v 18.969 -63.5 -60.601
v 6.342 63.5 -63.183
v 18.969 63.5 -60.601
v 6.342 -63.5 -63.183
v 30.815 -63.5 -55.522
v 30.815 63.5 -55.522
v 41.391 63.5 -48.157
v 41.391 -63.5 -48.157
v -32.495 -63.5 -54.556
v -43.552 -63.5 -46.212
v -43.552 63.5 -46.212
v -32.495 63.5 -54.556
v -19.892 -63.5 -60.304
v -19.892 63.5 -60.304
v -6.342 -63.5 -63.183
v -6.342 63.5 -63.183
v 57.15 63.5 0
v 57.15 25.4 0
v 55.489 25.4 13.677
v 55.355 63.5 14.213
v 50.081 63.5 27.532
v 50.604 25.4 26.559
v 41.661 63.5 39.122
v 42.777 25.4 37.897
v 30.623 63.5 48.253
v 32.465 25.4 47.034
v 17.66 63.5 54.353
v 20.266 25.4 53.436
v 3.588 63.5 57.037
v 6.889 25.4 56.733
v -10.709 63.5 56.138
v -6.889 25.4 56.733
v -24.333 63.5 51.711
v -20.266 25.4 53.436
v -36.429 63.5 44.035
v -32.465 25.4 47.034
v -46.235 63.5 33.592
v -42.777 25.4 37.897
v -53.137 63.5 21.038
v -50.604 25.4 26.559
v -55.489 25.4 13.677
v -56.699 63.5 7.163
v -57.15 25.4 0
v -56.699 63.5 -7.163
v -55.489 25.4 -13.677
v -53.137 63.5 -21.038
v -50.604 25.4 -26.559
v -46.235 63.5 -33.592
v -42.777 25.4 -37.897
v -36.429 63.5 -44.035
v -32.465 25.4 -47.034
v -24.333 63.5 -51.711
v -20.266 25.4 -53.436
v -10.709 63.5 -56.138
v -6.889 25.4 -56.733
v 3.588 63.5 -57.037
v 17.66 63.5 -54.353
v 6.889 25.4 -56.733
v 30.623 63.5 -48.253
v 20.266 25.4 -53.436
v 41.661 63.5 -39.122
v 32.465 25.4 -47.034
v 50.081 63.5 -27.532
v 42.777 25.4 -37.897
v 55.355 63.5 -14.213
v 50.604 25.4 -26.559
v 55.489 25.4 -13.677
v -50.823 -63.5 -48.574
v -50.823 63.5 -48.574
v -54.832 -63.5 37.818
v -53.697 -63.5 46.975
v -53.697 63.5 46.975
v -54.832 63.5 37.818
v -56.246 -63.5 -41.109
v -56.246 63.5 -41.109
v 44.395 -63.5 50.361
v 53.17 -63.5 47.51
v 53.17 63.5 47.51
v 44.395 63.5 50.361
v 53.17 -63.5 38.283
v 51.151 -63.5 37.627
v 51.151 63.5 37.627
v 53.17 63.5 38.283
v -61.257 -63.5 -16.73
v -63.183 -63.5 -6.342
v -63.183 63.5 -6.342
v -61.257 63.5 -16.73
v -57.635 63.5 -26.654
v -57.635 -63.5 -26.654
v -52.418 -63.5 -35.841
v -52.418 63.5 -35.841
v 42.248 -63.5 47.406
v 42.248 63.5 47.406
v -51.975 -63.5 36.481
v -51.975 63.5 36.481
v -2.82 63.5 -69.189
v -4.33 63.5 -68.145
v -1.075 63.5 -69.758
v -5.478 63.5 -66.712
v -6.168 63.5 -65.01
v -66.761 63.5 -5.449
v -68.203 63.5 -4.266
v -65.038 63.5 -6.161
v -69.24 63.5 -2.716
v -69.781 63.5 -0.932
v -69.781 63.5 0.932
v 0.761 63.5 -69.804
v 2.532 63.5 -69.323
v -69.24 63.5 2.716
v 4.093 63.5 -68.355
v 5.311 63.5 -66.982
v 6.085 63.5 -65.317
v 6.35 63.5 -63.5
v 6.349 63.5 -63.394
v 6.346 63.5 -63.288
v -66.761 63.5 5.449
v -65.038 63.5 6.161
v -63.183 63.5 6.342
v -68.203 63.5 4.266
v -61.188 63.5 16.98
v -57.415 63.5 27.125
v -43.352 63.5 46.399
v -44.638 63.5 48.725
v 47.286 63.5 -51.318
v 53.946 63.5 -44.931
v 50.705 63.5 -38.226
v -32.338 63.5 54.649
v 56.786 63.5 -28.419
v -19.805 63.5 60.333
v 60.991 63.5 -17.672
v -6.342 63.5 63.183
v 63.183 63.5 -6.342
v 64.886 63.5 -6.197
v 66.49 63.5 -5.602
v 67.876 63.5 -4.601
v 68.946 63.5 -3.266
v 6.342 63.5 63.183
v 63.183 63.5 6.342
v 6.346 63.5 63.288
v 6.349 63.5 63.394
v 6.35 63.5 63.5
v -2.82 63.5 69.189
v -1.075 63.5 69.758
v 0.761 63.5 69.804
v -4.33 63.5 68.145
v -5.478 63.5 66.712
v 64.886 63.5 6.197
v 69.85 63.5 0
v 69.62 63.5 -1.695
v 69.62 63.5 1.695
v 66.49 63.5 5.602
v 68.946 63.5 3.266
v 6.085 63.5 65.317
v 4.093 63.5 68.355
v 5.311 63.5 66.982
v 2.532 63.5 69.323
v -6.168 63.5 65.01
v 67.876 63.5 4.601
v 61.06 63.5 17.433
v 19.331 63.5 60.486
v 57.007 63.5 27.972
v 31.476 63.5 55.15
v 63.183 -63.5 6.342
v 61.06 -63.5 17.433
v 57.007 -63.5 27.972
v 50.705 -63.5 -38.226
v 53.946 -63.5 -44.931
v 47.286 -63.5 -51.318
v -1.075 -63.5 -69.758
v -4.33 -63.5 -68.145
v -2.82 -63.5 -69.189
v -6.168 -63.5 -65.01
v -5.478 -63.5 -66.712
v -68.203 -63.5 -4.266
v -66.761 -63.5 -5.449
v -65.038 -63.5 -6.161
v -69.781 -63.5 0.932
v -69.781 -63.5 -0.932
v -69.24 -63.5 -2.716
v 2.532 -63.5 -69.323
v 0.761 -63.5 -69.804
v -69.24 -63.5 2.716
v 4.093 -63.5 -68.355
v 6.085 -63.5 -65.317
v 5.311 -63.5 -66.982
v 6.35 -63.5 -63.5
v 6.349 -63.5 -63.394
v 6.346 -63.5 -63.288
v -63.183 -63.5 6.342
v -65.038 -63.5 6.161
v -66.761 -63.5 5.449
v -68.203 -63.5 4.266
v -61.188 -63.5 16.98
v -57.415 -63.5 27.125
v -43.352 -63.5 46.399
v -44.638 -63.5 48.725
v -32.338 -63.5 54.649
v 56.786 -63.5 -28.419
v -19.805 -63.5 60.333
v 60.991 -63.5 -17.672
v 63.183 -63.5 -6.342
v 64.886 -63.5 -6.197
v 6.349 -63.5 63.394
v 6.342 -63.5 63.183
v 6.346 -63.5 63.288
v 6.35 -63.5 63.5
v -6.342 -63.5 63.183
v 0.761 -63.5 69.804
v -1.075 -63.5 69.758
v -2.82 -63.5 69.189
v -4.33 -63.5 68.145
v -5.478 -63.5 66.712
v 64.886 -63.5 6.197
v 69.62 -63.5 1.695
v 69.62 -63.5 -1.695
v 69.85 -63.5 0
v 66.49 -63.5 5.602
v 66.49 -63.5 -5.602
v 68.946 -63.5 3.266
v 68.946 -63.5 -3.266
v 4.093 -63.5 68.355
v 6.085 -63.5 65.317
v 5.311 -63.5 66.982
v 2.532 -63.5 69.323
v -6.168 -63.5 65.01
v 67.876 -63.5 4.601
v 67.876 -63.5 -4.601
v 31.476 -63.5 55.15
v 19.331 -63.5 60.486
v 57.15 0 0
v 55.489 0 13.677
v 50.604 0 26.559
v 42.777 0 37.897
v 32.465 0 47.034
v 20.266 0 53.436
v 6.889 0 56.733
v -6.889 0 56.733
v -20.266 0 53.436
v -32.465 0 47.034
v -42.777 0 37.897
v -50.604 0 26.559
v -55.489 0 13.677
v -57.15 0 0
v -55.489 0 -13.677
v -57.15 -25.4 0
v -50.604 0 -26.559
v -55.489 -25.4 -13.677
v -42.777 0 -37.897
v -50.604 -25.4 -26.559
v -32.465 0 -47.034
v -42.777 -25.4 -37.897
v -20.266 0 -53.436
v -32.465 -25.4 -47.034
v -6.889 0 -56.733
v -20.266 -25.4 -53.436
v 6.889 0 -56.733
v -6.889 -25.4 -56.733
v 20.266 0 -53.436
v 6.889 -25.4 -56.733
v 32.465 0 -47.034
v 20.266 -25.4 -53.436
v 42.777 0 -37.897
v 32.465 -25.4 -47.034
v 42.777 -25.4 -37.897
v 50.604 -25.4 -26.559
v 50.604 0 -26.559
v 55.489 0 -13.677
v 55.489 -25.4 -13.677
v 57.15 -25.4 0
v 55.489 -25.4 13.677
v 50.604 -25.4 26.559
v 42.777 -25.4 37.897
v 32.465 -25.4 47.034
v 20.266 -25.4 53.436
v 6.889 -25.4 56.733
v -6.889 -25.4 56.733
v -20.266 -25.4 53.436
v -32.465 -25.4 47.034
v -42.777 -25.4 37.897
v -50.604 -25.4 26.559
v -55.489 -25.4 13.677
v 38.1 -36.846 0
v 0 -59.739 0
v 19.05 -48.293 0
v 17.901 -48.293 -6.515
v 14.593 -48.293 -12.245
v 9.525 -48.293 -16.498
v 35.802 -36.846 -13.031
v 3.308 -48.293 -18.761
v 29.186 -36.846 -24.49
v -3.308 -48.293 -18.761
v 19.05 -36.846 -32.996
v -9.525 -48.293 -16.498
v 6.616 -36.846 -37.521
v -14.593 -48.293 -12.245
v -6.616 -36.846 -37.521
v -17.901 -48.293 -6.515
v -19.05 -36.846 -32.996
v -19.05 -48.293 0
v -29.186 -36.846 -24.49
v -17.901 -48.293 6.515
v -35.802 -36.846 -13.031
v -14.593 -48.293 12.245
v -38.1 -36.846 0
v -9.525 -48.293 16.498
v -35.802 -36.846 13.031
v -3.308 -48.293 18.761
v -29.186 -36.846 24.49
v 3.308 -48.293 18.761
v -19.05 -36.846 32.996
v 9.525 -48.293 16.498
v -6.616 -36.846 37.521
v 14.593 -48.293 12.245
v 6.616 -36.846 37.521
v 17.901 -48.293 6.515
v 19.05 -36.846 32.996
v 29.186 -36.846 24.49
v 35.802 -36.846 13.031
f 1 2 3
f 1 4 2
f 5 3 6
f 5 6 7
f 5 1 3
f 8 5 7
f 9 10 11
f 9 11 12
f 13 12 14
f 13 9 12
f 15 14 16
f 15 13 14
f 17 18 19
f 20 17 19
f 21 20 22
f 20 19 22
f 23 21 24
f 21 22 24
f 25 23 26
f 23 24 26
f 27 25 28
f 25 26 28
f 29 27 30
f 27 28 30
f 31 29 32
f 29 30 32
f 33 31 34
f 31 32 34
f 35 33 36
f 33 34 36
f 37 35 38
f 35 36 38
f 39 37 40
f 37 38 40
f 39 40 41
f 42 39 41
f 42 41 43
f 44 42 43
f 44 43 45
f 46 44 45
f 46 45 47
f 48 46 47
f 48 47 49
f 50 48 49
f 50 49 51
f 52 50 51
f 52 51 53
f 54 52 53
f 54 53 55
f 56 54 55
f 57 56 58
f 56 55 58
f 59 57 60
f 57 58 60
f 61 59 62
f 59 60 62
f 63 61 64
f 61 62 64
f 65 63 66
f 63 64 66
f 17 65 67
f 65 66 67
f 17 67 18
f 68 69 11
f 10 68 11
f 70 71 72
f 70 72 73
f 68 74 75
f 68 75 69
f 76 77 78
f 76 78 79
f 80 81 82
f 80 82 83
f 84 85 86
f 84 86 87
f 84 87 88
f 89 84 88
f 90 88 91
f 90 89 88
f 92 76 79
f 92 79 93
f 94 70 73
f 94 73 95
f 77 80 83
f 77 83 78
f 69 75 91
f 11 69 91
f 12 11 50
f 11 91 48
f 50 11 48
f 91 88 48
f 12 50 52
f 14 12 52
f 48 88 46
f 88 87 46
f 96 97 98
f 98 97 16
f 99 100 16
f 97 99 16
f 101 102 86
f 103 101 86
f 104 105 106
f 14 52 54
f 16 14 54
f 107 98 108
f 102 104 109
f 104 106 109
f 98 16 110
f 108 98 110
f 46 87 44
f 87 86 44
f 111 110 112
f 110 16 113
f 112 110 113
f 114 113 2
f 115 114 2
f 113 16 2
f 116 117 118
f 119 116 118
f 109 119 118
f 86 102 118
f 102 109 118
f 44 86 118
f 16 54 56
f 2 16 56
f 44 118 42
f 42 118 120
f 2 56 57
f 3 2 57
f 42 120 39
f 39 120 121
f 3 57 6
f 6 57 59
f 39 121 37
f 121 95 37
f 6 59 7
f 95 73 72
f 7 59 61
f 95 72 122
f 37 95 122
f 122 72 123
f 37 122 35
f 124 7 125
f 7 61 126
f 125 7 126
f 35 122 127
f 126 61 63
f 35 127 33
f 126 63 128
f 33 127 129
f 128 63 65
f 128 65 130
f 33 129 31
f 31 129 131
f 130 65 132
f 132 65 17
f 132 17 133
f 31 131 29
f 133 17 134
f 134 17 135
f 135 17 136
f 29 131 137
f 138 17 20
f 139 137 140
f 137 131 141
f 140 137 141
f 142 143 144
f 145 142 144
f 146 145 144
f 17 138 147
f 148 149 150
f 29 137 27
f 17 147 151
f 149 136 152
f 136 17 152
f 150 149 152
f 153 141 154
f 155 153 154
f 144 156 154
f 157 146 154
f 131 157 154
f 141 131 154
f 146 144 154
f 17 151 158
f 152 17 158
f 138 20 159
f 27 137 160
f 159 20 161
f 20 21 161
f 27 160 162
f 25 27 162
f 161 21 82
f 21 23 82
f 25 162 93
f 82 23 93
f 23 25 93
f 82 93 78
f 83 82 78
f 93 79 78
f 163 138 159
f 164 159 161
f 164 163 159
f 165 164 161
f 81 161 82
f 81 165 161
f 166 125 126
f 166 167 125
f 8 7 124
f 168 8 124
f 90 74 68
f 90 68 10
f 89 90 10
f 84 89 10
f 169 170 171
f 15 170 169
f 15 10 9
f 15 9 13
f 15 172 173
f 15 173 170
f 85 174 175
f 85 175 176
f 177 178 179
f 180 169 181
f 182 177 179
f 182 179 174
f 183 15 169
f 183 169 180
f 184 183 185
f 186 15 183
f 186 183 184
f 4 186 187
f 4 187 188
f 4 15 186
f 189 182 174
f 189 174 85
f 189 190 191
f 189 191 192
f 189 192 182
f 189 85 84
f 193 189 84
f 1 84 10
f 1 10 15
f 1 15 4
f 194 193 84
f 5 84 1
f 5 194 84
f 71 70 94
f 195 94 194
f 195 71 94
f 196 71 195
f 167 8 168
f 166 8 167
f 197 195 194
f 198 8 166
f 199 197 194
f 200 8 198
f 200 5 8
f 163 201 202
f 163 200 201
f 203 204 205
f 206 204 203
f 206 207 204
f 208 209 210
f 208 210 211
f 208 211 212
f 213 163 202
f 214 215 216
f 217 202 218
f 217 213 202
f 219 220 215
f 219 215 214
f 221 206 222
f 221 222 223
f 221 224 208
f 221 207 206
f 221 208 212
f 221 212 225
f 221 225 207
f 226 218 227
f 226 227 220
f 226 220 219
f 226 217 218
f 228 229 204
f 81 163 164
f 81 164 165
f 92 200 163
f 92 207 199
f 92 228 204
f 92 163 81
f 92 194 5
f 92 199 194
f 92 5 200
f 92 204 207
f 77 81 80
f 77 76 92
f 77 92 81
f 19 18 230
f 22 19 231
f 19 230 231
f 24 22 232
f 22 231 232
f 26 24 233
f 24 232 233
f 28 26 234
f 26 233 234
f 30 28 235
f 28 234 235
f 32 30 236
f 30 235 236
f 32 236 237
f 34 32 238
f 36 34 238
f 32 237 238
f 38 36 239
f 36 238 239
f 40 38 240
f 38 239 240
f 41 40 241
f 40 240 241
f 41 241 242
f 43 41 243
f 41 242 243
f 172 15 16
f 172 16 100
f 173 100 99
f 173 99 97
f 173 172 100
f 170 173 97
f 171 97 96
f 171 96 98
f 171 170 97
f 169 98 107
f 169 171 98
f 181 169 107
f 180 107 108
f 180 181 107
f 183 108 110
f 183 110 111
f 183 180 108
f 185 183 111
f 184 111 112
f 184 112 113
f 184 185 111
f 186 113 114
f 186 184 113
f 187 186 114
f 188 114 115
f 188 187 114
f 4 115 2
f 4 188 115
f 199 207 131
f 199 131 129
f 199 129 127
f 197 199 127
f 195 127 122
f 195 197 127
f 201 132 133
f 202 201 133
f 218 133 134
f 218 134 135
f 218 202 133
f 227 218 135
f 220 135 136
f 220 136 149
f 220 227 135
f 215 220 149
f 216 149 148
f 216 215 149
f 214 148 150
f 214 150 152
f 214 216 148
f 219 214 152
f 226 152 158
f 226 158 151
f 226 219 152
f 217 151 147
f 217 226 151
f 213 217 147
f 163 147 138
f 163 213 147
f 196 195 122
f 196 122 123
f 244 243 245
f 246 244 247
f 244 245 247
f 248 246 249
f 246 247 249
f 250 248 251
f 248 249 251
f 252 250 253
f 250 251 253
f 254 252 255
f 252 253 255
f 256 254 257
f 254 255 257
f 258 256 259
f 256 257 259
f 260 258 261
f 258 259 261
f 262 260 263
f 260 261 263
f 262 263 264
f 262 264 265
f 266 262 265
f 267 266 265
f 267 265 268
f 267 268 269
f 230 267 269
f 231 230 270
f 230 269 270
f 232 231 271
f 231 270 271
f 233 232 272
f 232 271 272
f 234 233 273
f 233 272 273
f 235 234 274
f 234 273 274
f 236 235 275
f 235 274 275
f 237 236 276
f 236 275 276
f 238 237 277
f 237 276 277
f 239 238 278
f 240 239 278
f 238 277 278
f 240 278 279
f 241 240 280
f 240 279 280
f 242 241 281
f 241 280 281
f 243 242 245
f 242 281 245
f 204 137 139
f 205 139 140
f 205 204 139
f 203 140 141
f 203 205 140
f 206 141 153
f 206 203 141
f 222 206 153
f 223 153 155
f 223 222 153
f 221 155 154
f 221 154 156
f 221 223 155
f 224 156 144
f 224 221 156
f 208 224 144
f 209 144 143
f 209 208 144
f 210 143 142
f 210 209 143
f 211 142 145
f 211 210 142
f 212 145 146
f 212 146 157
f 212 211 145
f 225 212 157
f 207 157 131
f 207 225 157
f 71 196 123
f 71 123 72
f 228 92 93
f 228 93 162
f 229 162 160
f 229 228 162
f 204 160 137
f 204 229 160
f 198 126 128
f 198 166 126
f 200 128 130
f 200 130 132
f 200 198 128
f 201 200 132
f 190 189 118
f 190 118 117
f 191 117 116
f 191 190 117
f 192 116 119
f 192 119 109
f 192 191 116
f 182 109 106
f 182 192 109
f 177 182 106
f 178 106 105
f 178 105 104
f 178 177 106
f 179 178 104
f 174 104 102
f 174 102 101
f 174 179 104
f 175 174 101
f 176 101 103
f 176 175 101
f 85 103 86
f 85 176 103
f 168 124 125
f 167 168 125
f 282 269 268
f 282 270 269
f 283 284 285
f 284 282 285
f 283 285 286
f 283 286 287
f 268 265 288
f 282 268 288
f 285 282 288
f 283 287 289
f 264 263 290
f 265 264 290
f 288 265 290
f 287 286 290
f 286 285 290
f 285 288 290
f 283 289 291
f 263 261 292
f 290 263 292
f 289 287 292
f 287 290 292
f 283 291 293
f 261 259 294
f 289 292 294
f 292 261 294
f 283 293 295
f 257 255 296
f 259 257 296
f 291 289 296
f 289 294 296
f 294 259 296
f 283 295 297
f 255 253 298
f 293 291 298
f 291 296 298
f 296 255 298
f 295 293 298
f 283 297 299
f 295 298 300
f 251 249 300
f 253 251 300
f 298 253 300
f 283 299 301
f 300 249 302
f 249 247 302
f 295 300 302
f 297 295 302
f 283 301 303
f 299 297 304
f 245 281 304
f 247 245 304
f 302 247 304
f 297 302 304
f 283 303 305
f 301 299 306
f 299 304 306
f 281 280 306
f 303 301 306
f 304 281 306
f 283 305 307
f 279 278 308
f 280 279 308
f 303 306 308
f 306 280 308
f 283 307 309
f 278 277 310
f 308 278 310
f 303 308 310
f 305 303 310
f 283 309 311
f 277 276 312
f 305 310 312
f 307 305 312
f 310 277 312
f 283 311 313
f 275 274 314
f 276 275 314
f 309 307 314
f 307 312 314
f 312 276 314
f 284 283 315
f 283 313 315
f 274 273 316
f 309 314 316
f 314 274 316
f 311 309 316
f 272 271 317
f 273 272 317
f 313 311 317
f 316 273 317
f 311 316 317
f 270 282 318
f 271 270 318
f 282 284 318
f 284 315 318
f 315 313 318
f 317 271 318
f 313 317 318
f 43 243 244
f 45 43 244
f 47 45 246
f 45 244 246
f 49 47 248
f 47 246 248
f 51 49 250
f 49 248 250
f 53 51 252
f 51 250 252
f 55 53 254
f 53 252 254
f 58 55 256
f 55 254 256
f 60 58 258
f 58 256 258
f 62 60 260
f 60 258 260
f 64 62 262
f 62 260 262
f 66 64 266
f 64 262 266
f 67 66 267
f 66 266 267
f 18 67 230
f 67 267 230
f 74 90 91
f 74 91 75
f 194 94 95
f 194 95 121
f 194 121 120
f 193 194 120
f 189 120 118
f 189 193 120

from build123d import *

# Parameters (mm, degrees)
F1_DEPTH = 63.5
F2_D     = 114.3
F2_DEPTH = 63.501
F3_D     = 114.3
F3_DEPTH = 25.4
F3_TIP   = 34.3391843774


with BuildPart() as f1:
    # F0 (on Front) → F1 (new body, symmetric)
    with BuildSketch(Plane.XZ):
        with BuildLine():
            ThreePointArc((63.1825, -6.3420575329), (63.4205753285, -3.175), (63.5, 0))
            ThreePointArc((63.5, 0), (63.4205753285, 3.175), (63.1825, 6.3420575329))
            ThreePointArc((63.1825, 6.3420575329), (57.15, 0), (63.1825, -6.3420575329))
        make_face()
        with BuildLine():
            ThreePointArc((63.1825, 6.3420575329), (63.4205753285, 3.175), (63.5, 0))
            ThreePointArc((63.5, 0), (63.4205753285, -3.175), (63.1825, -6.3420575329))
            ThreePointArc((63.1825, -6.3420575329), (67.8764354788, -4.6010121169), (69.85, 0))
            ThreePointArc((69.85, 0), (67.8764354788, 4.6010121169), (63.1825, 6.3420575329))
        make_face()
        with BuildLine():
            ThreePointArc((63.1825, -6.3420575329), (57.15, 0), (63.1825, 6.3420575329))
            ThreePointArc((63.1825, 6.3420575329), (59.2684226035, 22.7926321889), (51.1514073356, 37.6268989898))
            Line((51.1514073356, 37.6268989898), (44.3948691925, 35.4315666688))
            Line((44.3948691925, 35.4315666688), (38.9713217069, 42.8964393729))
            Line((38.9713217069, 42.8964393729), (42.2479521953, 47.4063343373))
            ThreePointArc((42.2479521953, 47.4063343373), (25.5434749418, 58.1358829631), (6.3420575329, 63.1825))
            ThreePointArc((6.3420575329, 63.1825), (0, 57.15), (-6.3420575329, 63.1825))
            ThreePointArc((-6.3420575329, 63.1825), (-26.2258003585, 57.831283883), (-43.351850487, 46.3989984736))
            Line((-43.351850487, 46.3989984736), (-40.1734631197, 40.6496002242))
            Line((-40.1734631197, 40.6496002242), (-46.4740063985, 33.9085063805))
            Line((-46.4740063985, 33.9085063805), (-51.9747429826, 36.4811744862))
            ThreePointArc((-51.9747429826, 36.4811744862), (-59.5179741382, 22.132798162), (-63.1825, 6.3420575329))
            ThreePointArc((-63.1825, 6.3420575329), (-58.8989878831, 4.3764354788), (-57.15, 0))
            ThreePointArc((-57.15, 0), (-58.8989878831, -4.3764354788), (-63.1825, -6.3420575329))
            ThreePointArc((-63.1825, -6.3420575329), (-59.6526265915, -21.7672722391), (-52.4184059941, -35.8407688679))
            Line((-52.4184059941, -35.8407688679), (-50.8226124015, -33.6443474184))
            Line((-50.8226124015, -33.6443474184), (-42.0471282301, -36.4956750697))
            Line((-42.0471282301, -36.4956750697), (-42.0471282301, -45.7227651753))
            Line((-42.0471282301, -45.7227651753), (-43.5515690674, -46.2115876352))
            ThreePointArc((-43.5515690674, -46.2115876352), (-26.3504546537, -57.7745925087), (-6.3420575329, -63.1825))
            ThreePointArc((-6.3420575329, -63.1825), (0, -57.15), (6.3420575329, -63.1825))
            ThreePointArc((6.3420575329, -63.1825), (25.0210307502, -58.3626423339), (41.3908210079, -48.1565149932))
            Line((41.3908210079, -48.1565149932), (39.1545134974, -46.9573614133))
            Line((39.1545134974, -46.9573614133), (40.7886670188, -37.876131646))
            Line((40.7886670188, -37.876131646), (49.9304109745, -36.6240496733))
            Line((49.9304109745, -36.6240496733), (50.7049691251, -38.2263797138))
            ThreePointArc((50.7049691251, -38.2263797138), (59.1332512734, -23.1410586153), (63.1825, -6.3420575329))
        make_face()
        with BuildLine():
            Line((44.3948691925, 35.4315666688), (51.1514073356, 37.6268989898))
            ThreePointArc((51.1514073356, 37.6268989898), (46.9549723579, 42.7490417539), (42.2479521953, 47.4063343373))
            Line((42.2479521953, 47.4063343373), (38.9713217069, 42.8964393729))
            Line((38.9713217069, 42.8964393729), (44.3948691925, 35.4315666688))
        make_face()
        with BuildLine():
            ThreePointArc((42.2479521953, 47.4063343373), (46.9549723579, 42.7490417539), (51.1514073356, 37.6268989898))
            Line((51.1514073356, 37.6268989898), (53.170353364, 38.28289432))
            Line((53.170353364, 38.28289432), (53.170353364, 47.5099844257))
            Line((53.170353364, 47.5099844257), (44.3948691925, 50.361312077))
            Line((44.3948691925, 50.361312077), (42.2479521953, 47.4063343373))
        make_face()
        with BuildLine():
            Line((53.9461659342, -44.9314502248), (50.7049691251, -38.2263797138))
            ThreePointArc((50.7049691251, -38.2263797138), (46.3147982477, -43.4417939694), (41.3908210079, -48.1565149932))
            Line((41.3908210079, -48.1565149932), (47.286295034, -51.3177880964))
            Line((47.286295034, -51.3177880964), (53.9461659342, -44.9314502248))
        make_face()
        with BuildLine():
            ThreePointArc((41.3908210079, -48.1565149932), (46.3147982477, -43.4417939694), (50.7049691251, -38.2263797138))
            Line((50.7049691251, -38.2263797138), (49.9304109745, -36.6240496733))
            Line((49.9304109745, -36.6240496733), (40.7886670188, -37.876131646))
            Line((40.7886670188, -37.876131646), (39.1545134974, -46.9573614133))
            Line((39.1545134974, -46.9573614133), (41.3908210079, -48.1565149932))
        make_face()
        with BuildLine():
            ThreePointArc((-6.3420575329, 63.1825), (0, 57.15), (6.3420575329, 63.1825))
            ThreePointArc((6.3420575329, 63.1825), (0, 63.5), (-6.3420575329, 63.1825))
        make_face()
        with BuildLine():
            ThreePointArc((-6.3420575329, 63.1825), (0, 63.5), (6.3420575329, 63.1825))
            ThreePointArc((6.3420575329, 63.1825), (6.3480140727, 63.3412003363), (6.35, 63.5))
            ThreePointArc((6.35, 63.5), (-0.1587996637, 69.8480140727), (-6.3420575329, 63.1825))
        make_face()
        with BuildLine():
            ThreePointArc((6.35, -63.5), (6.3480140727, -63.3412003363), (6.3420575329, -63.1825))
            ThreePointArc((6.3420575329, -63.1825), (0, -63.5), (-6.3420575329, -63.1825))
            ThreePointArc((-6.3420575329, -63.1825), (-0.1587996637, -69.8480140727), (6.35, -63.5))
        make_face()
        with BuildLine():
            ThreePointArc((-6.3420575329, -63.1825), (0, -63.5), (6.3420575329, -63.1825))
            ThreePointArc((6.3420575329, -63.1825), (0, -57.15), (-6.3420575329, -63.1825))
        make_face()
        with BuildLine():
            Line((-40.1734631197, 40.6496002242), (-43.351850487, 46.3989984736))
            ThreePointArc((-43.351850487, 46.3989984736), (-47.9205661881, 41.6637652668), (-51.9747429826, 36.4811744862))
            Line((-51.9747429826, 36.4811744862), (-46.4740063985, 33.9085063805))
            Line((-46.4740063985, 33.9085063805), (-40.1734631197, 40.6496002242))
        make_face()
        with BuildLine():
            ThreePointArc((-51.9747429826, 36.4811744862), (-47.9205661881, 41.6637652668), (-43.351850487, 46.3989984736))
            Line((-43.351850487, 46.3989984736), (-44.6376493999, 48.7248855241))
            Line((-44.6376493999, 48.7248855241), (-53.6972115319, 46.9745924645))
            Line((-53.6972115319, 46.9745924645), (-54.8321425725, 37.8175665635))
            Line((-54.8321425725, 37.8175665635), (-51.9747429826, 36.4811744862))
        make_face()
        with BuildLine():
            Line((-50.8226124015, -48.5740928266), (-43.5515690674, -46.2115876352))
            ThreePointArc((-43.5515690674, -46.2115876352), (-48.2643501852, -41.2650275802), (-52.4184059941, -35.8407688679))
            Line((-52.4184059941, -35.8407688679), (-56.2461598872, -41.1092201225))
            Line((-56.2461598872, -41.1092201225), (-50.8226124015, -48.5740928266))
        make_face()
        with BuildLine():
            ThreePointArc((-52.4184059941, -35.8407688679), (-48.2643501852, -41.2650275802), (-43.5515690674, -46.2115876352))
            Line((-43.5515690674, -46.2115876352), (-42.0471282301, -45.7227651753))
            Line((-42.0471282301, -45.7227651753), (-42.0471282301, -36.4956750697))
            Line((-42.0471282301, -36.4956750697), (-50.8226124015, -33.6443474184))
            Line((-50.8226124015, -33.6443474184), (-52.4184059941, -35.8407688679))
        make_face()
        with BuildLine():
            ThreePointArc((-57.15, 0), (-58.8989878831, 4.3764354788), (-63.1825, 6.3420575329))
            ThreePointArc((-63.1825, 6.3420575329), (-63.5, 0), (-63.1825, -6.3420575329))
            ThreePointArc((-63.1825, -6.3420575329), (-58.8989878831, -4.3764354788), (-57.15, 0))
        make_face()
        with BuildLine():
            ThreePointArc((-63.1825, -6.3420575329), (-63.5, 0), (-63.1825, 6.3420575329))
            ThreePointArc((-63.1825, 6.3420575329), (-69.85, 0), (-63.1825, -6.3420575329))
        make_face()
    extrude(amount=F1_DEPTH, both=True)

    # F2 (through all, one way)
    with BuildSketch(Plane.XZ):
        with Locations((0, 0)):
            Circle(F2_D / 2)
    extrude(amount=-F2_DEPTH, mode=Mode.SUBTRACT)

    # F3
    with Locations(Plane(origin=(0, 0, 0), x_dir=(1, 0, 0), z_dir=(0, 1, 0))):
        with Locations((0, 0)):
            Hole(F3_D / 2, depth=F3_DEPTH)
            with Locations((0, 0, -(F3_DEPTH + F3_TIP / 2))):  # 118° drill point
                Cone(0, F3_D / 2, F3_TIP, mode=Mode.SUBTRACT)


solid = f1.part
